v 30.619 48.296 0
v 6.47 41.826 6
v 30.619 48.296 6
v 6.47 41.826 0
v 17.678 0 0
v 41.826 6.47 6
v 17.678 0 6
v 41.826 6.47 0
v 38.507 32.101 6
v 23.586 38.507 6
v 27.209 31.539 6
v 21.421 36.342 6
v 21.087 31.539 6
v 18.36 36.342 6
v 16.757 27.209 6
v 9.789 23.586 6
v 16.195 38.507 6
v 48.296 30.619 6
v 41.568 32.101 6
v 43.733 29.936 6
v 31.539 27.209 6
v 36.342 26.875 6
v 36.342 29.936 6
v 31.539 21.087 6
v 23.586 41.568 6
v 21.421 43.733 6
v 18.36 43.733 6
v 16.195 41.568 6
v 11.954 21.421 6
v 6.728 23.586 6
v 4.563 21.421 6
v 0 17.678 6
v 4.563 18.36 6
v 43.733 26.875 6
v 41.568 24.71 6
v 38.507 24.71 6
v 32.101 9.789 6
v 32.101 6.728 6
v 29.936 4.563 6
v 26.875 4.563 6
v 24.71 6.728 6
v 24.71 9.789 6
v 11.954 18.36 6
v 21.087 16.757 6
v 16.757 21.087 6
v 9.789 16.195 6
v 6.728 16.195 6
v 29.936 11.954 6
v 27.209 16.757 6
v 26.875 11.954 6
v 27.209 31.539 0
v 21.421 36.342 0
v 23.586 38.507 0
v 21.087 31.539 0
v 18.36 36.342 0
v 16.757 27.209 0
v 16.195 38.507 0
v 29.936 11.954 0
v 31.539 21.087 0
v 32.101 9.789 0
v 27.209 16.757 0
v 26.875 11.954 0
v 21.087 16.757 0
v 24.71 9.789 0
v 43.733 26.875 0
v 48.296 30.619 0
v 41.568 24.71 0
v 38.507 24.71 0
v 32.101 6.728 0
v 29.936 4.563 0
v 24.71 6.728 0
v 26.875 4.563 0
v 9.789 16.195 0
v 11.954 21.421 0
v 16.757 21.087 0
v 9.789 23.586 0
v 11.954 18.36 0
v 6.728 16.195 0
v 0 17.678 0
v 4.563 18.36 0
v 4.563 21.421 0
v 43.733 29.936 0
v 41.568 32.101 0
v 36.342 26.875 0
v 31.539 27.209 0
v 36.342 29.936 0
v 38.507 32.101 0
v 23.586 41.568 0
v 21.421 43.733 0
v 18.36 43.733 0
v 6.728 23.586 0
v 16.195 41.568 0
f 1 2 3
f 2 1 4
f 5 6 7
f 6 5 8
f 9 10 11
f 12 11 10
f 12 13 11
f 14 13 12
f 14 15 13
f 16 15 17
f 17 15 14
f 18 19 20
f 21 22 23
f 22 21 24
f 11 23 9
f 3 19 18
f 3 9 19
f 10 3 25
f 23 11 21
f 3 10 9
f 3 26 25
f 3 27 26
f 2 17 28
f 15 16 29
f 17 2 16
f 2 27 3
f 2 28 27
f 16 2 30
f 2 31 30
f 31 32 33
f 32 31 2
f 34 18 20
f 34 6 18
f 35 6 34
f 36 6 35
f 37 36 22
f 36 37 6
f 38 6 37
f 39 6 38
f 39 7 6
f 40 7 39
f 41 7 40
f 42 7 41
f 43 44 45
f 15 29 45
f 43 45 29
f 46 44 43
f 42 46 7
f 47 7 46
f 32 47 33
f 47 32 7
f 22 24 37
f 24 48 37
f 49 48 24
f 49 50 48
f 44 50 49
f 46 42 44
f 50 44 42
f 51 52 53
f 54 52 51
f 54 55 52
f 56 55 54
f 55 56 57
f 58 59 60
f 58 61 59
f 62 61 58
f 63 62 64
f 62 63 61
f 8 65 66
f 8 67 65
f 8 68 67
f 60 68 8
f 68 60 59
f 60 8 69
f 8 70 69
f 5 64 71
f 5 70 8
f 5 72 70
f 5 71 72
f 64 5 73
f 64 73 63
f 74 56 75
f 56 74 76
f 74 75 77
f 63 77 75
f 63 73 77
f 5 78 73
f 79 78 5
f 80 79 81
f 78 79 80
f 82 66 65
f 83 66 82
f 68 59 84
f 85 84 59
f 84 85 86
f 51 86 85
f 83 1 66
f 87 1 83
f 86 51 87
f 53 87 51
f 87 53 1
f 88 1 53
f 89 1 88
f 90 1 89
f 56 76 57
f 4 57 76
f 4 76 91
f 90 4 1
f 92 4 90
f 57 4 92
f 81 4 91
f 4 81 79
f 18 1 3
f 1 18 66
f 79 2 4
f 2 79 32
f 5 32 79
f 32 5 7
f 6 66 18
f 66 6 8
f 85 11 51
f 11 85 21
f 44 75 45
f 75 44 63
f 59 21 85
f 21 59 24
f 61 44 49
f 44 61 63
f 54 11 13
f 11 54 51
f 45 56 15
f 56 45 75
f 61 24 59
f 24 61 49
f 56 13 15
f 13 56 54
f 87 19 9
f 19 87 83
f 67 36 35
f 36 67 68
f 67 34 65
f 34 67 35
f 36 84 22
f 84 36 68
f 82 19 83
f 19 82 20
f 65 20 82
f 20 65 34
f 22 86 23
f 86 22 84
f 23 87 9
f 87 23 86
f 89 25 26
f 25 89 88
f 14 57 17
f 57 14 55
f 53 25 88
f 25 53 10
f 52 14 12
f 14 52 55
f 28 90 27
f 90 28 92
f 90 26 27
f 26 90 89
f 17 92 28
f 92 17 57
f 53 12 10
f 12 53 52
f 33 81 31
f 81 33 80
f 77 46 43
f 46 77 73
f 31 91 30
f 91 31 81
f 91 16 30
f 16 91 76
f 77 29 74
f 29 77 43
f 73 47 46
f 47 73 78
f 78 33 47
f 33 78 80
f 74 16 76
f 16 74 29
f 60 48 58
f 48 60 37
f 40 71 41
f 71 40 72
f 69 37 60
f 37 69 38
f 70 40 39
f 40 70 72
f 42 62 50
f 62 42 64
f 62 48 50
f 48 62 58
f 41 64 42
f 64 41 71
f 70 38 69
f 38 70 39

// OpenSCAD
$fn = 32;

// ----------------------------------------------------------------------
// Polygon plate: 6-gon R25, 4 bolt windows
// ----------------------------------------------------------------------

// --- parameters (mm) ---
sides = 6;                // number of polygon sides
plate_r = 25;             // circumscribed radius of the polygon
bore_r = 8;               // centre bore radius
bolts = 4;                // number of bolt windows
ring_r = 16.45;           // bolt-circle radius
bolt_r = 4;               // bolt window radius
plate_t = 6;              // plate thickness, Z (extrusion height)
fit_tol = 0.05;           // declared fit tolerance (prompt contract)
free_tol = 0.3;           // declared free tolerance (prompt contract)

plate_d = 2 * plate_r;  // circumscribed diameter
bore_d = 2 * bore_r;  // centre bore diameter
bolt_d = 2 * bolt_r;  // bolt window diameter
ring_d = 2 * ring_r;  // bolt-circle diameter

profile = [[48.296, 30.619], [30.619, 48.296], [6.47, 41.826], [0, 17.678], [17.678, 0], [41.826, 6.47]];  // primary outline, 6 points, counter clockwise
void_1 = [[31.539, 27.209], [27.209, 31.539], [21.087, 31.539], [16.757, 27.209], [16.757, 21.087], [21.087, 16.757], [27.209, 16.757], [31.539, 21.087]];  // centre bore, 8 points
void_2 = [[43.733, 29.936], [41.568, 32.101], [38.507, 32.101], [36.342, 29.936], [36.342, 26.875], [38.507, 24.71], [41.568, 24.71], [43.733, 26.875]];  // bolt window 1, 8 points
void_3 = [[23.586, 41.568], [21.421, 43.733], [18.36, 43.733], [16.195, 41.568], [16.195, 38.507], [18.36, 36.342], [21.421, 36.342], [23.586, 38.507]];  // bolt window 2, 8 points
void_4 = [[11.954, 21.421], [9.789, 23.586], [6.728, 23.586], [4.563, 21.421], [4.563, 18.36], [6.728, 16.195], [9.789, 16.195], [11.954, 18.36]];  // bolt window 3, 8 points
void_5 = [[32.101, 9.789], [29.936, 11.954], [26.875, 11.954], [24.71, 9.789], [24.71, 6.728], [26.875, 4.563], [29.936, 4.563], [32.101, 6.728]];  // bolt window 4, 8 points

// --- the one profile operation ---
difference() {
  linear_extrude(height = plate_t) polygon(points = profile);
  translate([0, 0, -1])
    linear_extrude(height = plate_t + 2) polygon(points = void_1);
  translate([0, 0, -1])
    linear_extrude(height = plate_t + 2) polygon(points = void_2);
  translate([0, 0, -1])
    linear_extrude(height = plate_t + 2) polygon(points = void_3);
  translate([0, 0, -1])
    linear_extrude(height = plate_t + 2) polygon(points = void_4);
  translate([0, 0, -1])
    linear_extrude(height = plate_t + 2) polygon(points = void_5);
}
